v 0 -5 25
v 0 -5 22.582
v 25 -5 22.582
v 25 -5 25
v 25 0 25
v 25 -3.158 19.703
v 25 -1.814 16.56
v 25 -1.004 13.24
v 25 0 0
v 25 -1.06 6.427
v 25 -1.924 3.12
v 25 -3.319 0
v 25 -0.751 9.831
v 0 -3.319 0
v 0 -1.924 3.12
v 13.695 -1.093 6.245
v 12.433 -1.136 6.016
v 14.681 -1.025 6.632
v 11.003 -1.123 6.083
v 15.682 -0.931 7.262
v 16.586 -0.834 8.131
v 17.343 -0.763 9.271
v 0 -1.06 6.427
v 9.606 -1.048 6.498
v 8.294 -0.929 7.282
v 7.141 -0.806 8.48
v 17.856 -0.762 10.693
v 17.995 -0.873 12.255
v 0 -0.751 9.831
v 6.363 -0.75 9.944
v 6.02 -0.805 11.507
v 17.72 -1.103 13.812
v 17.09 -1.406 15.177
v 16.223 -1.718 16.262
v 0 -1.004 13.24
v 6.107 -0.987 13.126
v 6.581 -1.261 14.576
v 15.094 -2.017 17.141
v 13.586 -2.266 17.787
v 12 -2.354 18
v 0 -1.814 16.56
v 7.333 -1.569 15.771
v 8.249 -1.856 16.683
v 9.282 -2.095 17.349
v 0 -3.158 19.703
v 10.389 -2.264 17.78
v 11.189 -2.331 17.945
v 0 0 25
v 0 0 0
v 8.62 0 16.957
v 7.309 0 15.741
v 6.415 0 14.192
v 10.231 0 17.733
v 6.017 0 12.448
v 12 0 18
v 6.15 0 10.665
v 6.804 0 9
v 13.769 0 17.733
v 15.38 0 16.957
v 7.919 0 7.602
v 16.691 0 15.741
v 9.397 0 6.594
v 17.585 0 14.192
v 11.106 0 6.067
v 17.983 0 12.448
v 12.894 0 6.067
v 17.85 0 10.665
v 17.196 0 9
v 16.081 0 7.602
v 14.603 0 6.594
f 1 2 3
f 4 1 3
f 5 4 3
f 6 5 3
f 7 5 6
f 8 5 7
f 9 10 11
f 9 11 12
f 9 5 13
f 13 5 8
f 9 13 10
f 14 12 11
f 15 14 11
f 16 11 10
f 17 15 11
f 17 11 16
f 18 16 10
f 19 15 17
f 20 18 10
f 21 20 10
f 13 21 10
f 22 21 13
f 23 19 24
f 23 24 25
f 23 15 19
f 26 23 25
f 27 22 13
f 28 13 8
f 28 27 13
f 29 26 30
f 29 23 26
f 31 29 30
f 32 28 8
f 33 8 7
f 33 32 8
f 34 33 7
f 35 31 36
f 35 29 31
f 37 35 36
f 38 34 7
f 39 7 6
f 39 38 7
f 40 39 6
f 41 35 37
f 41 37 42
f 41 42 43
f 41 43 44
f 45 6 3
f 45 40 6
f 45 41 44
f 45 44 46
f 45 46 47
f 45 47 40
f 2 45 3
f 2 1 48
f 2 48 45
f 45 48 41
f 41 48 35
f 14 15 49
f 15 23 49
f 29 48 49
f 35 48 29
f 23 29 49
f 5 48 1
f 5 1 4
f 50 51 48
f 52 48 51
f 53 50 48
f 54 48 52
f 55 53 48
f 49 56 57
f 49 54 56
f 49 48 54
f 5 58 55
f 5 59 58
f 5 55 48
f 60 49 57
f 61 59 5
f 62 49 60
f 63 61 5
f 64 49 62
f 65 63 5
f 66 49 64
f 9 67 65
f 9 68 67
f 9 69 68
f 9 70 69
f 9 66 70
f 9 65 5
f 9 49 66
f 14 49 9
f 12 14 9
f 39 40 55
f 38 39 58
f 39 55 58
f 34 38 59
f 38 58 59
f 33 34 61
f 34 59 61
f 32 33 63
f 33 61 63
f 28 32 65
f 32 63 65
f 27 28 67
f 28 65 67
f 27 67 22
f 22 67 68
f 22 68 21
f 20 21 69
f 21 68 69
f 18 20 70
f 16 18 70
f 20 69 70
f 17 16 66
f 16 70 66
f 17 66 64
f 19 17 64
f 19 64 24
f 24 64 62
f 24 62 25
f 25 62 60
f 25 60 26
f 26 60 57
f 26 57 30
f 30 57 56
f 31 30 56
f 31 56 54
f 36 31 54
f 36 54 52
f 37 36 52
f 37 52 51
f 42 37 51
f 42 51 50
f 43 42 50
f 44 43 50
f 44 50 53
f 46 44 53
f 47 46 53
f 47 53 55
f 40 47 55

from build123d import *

# Parameters (mm, degrees)
SKETCH1_W          = 25
SKETCH1_H          = 25
SKETCH1_R          = 6
EXTRUDE1_DEPTH     = 5
SKETCH2_R          = 20.75
CUT_EXTRUDE1_DEPTH = 26


with BuildPart() as part:
    # Sketch1 → Extrude1 (new body)
    with BuildSketch(Plane(origin=(0, 0, 0), x_dir=(1, 0, 0), z_dir=(0, 1, 0))):
        with Locations((12.5, -12.5)):
            Rectangle(SKETCH1_W, SKETCH1_H)
        with Locations(Location((12, -12, 0), (0, 0, 270))):  # turned: the seam where the file's is
            Circle(SKETCH1_R, mode=Mode.SUBTRACT)
    extrude(amount=-EXTRUDE1_DEPTH)

    # Sketch2 → Cut-Extrude1 (cut, through all)
    with BuildSketch(Plane(origin=(0, 0, 0), x_dir=(0, 0, -1), z_dir=(1, 0, 0))):
        with Locations((-10, -21.5)):
            Circle(SKETCH2_R)
    extrude(amount=CUT_EXTRUDE1_DEPTH, mode=Mode.SUBTRACT)


solid = part.part
